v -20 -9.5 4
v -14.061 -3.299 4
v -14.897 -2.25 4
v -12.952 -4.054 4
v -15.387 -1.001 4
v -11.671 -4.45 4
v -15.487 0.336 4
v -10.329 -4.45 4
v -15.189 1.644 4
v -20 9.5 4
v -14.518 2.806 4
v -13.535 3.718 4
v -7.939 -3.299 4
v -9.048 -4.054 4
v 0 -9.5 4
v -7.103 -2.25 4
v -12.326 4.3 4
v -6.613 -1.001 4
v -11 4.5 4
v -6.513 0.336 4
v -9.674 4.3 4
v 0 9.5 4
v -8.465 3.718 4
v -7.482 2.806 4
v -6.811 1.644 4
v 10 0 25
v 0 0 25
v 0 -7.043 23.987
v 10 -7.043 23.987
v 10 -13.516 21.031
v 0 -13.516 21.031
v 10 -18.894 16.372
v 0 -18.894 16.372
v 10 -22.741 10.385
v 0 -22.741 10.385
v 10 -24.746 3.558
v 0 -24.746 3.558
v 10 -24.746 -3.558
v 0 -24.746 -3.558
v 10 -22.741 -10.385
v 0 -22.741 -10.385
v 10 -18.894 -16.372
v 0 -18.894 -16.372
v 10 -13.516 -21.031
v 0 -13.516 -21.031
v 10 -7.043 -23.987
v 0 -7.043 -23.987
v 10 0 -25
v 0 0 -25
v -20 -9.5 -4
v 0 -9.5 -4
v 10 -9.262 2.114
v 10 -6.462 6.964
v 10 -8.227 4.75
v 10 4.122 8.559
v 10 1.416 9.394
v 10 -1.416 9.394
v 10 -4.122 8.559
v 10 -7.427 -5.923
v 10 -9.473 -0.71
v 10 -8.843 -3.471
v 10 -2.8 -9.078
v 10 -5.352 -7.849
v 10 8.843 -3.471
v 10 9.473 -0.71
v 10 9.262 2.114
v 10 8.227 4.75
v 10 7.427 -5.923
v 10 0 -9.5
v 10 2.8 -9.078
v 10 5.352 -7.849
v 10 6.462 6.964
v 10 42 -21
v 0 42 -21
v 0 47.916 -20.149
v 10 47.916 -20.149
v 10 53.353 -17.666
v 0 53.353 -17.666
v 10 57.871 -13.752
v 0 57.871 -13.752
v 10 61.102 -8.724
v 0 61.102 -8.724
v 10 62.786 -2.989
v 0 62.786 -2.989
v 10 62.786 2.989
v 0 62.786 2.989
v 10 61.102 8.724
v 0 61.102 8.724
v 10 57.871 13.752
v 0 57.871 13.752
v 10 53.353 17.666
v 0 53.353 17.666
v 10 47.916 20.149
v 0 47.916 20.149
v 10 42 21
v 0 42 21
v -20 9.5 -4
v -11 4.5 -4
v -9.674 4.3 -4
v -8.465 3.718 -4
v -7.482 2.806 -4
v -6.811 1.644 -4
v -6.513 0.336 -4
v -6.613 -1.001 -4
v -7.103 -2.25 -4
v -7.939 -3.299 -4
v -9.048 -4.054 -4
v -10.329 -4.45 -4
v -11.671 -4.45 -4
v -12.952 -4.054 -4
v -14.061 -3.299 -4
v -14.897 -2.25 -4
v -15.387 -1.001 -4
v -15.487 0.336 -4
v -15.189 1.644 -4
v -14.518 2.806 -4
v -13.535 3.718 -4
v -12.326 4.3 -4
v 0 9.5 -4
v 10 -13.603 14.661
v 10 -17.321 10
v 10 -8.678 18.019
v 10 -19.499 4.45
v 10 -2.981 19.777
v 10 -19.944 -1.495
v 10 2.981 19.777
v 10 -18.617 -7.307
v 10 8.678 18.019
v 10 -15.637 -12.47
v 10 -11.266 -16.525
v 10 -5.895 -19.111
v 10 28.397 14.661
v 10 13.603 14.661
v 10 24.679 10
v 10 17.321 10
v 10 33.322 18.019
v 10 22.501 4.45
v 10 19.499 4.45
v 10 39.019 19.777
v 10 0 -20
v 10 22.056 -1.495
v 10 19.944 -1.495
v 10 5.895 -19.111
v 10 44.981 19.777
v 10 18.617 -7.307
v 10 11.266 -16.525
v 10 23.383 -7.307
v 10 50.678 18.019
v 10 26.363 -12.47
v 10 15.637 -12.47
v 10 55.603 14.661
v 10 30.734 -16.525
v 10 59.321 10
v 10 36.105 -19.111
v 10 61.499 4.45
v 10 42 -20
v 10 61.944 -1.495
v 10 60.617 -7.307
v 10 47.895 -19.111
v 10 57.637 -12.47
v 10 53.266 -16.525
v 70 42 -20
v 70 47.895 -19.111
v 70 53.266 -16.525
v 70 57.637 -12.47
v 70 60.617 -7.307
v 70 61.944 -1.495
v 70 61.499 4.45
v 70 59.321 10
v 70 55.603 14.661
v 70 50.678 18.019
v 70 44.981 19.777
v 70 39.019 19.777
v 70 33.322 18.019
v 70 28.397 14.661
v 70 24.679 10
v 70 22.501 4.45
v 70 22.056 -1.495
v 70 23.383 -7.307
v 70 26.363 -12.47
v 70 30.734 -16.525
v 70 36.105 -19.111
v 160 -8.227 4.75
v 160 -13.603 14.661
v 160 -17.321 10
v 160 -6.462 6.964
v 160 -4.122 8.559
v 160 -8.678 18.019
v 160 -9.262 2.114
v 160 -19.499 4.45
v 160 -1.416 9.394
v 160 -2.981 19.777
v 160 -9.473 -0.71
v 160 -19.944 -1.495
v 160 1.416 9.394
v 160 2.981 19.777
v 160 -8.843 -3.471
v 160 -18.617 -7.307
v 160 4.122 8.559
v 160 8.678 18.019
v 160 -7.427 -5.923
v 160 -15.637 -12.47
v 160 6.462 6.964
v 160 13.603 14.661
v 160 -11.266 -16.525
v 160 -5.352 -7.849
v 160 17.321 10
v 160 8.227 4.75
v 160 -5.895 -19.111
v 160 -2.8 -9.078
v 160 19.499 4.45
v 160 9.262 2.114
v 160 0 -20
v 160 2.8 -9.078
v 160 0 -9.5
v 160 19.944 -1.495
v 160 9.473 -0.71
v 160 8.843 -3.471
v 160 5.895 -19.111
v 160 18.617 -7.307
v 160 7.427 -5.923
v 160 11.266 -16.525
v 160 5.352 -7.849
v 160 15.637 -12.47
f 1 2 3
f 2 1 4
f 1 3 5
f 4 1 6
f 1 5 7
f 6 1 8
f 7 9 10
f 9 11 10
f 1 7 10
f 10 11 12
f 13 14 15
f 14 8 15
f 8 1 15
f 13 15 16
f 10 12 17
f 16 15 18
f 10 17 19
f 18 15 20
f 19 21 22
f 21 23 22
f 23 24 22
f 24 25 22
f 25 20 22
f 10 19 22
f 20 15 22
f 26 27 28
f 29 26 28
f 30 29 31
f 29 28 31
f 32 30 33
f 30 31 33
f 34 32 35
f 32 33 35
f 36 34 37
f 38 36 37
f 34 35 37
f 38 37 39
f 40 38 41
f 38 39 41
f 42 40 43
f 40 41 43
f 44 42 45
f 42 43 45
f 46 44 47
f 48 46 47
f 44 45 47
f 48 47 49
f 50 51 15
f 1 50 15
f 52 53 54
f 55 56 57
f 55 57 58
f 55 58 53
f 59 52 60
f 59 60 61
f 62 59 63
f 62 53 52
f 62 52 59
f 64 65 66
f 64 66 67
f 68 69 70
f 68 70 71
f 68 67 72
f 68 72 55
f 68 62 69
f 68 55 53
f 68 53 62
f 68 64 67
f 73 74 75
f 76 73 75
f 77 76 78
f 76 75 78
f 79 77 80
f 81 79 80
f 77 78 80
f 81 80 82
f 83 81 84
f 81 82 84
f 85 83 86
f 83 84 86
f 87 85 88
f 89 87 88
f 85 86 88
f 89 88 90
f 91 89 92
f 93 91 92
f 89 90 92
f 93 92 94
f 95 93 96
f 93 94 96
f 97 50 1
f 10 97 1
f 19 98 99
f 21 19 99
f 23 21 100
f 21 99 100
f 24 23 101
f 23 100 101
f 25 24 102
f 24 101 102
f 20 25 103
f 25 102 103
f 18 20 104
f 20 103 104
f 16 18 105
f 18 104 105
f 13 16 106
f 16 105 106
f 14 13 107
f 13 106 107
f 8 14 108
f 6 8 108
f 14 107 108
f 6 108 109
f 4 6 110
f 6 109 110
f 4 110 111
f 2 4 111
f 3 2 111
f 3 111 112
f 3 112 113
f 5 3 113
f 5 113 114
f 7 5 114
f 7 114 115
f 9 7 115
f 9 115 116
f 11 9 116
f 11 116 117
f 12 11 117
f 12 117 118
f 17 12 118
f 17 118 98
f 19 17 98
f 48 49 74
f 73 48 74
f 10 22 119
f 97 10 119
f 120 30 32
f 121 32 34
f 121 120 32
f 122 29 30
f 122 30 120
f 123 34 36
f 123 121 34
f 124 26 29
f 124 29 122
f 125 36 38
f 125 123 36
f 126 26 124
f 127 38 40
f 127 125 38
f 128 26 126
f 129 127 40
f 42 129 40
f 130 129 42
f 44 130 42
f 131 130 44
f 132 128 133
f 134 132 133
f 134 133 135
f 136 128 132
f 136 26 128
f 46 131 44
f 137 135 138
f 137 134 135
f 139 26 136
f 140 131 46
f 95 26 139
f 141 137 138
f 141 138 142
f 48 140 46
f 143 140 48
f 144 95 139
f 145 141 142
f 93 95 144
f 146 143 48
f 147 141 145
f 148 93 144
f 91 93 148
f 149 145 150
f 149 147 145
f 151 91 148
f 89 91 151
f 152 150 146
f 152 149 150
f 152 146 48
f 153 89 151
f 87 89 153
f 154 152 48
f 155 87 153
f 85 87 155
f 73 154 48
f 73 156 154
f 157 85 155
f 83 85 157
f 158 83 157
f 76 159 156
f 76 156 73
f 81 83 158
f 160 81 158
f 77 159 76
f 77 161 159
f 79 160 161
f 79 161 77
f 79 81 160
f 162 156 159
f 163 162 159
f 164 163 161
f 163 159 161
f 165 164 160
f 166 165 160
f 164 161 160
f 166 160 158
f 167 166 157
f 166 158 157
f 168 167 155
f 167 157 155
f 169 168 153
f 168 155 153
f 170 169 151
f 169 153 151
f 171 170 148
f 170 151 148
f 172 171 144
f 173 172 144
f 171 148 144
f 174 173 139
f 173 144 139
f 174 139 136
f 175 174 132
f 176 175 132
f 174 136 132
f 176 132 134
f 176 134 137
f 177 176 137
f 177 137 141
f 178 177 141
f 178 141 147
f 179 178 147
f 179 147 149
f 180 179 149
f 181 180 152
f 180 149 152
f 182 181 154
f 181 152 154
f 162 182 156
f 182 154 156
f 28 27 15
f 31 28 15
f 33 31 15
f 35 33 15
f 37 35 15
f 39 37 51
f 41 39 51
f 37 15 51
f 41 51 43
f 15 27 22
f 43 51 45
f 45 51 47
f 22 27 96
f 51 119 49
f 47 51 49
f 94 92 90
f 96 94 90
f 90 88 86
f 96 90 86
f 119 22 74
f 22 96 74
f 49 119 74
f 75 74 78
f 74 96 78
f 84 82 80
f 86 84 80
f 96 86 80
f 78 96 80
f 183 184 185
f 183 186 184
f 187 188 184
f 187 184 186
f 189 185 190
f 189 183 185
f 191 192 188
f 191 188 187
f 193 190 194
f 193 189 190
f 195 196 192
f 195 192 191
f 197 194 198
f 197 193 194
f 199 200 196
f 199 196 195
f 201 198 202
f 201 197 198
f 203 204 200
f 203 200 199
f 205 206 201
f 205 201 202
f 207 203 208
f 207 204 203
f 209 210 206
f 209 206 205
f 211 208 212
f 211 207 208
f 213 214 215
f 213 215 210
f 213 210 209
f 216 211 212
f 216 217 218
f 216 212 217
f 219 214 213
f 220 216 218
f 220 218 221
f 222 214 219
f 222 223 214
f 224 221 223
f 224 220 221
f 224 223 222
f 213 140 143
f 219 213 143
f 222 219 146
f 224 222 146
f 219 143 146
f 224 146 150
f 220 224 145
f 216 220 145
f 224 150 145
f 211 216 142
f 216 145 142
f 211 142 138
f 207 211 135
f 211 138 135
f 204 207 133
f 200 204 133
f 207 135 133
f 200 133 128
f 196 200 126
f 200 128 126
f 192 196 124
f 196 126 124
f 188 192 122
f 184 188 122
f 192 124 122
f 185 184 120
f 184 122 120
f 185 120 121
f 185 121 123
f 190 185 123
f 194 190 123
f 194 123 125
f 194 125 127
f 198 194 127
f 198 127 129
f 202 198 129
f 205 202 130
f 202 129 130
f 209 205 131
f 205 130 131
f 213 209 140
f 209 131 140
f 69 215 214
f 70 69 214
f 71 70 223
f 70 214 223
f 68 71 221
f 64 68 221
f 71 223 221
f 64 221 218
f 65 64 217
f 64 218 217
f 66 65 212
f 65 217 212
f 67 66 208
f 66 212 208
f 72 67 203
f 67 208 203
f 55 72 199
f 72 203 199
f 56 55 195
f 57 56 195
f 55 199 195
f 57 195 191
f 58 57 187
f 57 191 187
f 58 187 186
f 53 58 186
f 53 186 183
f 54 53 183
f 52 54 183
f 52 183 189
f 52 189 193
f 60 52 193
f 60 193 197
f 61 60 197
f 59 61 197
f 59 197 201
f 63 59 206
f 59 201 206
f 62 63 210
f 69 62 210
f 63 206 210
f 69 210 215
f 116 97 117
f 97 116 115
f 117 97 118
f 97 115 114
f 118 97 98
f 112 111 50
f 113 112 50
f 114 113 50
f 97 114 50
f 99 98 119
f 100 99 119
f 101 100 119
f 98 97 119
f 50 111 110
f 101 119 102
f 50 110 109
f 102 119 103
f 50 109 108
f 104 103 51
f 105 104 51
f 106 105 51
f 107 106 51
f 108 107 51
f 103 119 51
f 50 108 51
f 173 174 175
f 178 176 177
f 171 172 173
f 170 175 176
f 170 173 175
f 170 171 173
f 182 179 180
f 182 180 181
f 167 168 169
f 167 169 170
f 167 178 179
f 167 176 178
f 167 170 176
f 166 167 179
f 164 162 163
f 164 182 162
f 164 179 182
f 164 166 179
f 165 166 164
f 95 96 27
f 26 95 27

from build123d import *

# Parameters (mm, degrees)
BOSS_EXTRUDE1_DEPTH = 10
BOSS_EXTRUDE2_DEPTH = 20
SKETCH3_R           = 4.5
CUT_EXTRUDE1_DEPTH  = 73.18032973
SKETCH5_R           = 20
BOSS_EXTRUDE4_DEPTH = 150
BOSS_EXTRUDE5_DEPTH = 60
SKETCH7_R           = 9.5
CUT_EXTRUDE2_DEPTH  = 150


with BuildPart() as part:
    # Sketch1 → Boss-Extrude1 (new body)
    with BuildSketch(Plane(origin=(0, 0, 0), x_dir=(0, 0, -1), z_dir=(1, 0, 0))):
        with BuildLine():
            Line((-21, 42), (-25, 0))
            ThreePointArc((-25, 0), (0, -25), (25, 0))
            Line((25, 0), (21, 42))
            ThreePointArc((21, 42), (0, 63), (-21, 42))
        make_face()
    extrude(amount=BOSS_EXTRUDE1_DEPTH)

    # Sketch2 → Boss-Extrude2 (add)
    with BuildSketch(Plane.ZY):
        Polygon((0, 9.5), (-4, 9.5), (-4, -9.5), (4, -9.5), (4, 9.5), align=None)
    extrude(amount=BOSS_EXTRUDE2_DEPTH)

    # Sketch3 → Cut-Extrude1 (cut, through all)
    with BuildSketch(Plane(origin=(0, 0, -4), x_dir=(-1, 0, 0), z_dir=(0, 0, -1))):
        with Locations(Location((11, 0, 0), (0, 0, 90))):
            Circle(SKETCH3_R)
    extrude(amount=-CUT_EXTRUDE1_DEPTH, mode=Mode.SUBTRACT)

    # Sketch5 → Boss-Extrude4 (add)
    with BuildSketch(Plane(origin=(10, 0, 0), x_dir=(0, 0, -1), z_dir=(1, 0, 0))):
        Circle(SKETCH5_R)
    extrude(amount=BOSS_EXTRUDE4_DEPTH)

    # Sketch6 → Boss-Extrude5 (add)
    with BuildSketch(Plane(origin=(10, 0, 0), x_dir=(0, 0, -1), z_dir=(1, 0, 0))):
        with BuildLine():
            ThreePointArc((-20, 42), (0, 22), (20, 42))
            Line((20, 42), (-20, 42))
        make_face()
        with BuildLine():
            Line((-20, 42), (20, 42))
            ThreePointArc((20, 42), (0, 62), (-20, 42))
        make_face()
    extrude(amount=BOSS_EXTRUDE5_DEPTH)

    # Sketch7 → Cut-Extrude2 (cut)
    with BuildSketch(Plane(origin=(160, 0, 0), x_dir=(0, 0, -1), z_dir=(1, 0, 0))):
        Circle(SKETCH7_R)
    extrude(amount=-CUT_EXTRUDE2_DEPTH, mode=Mode.SUBTRACT)


solid = part.part
